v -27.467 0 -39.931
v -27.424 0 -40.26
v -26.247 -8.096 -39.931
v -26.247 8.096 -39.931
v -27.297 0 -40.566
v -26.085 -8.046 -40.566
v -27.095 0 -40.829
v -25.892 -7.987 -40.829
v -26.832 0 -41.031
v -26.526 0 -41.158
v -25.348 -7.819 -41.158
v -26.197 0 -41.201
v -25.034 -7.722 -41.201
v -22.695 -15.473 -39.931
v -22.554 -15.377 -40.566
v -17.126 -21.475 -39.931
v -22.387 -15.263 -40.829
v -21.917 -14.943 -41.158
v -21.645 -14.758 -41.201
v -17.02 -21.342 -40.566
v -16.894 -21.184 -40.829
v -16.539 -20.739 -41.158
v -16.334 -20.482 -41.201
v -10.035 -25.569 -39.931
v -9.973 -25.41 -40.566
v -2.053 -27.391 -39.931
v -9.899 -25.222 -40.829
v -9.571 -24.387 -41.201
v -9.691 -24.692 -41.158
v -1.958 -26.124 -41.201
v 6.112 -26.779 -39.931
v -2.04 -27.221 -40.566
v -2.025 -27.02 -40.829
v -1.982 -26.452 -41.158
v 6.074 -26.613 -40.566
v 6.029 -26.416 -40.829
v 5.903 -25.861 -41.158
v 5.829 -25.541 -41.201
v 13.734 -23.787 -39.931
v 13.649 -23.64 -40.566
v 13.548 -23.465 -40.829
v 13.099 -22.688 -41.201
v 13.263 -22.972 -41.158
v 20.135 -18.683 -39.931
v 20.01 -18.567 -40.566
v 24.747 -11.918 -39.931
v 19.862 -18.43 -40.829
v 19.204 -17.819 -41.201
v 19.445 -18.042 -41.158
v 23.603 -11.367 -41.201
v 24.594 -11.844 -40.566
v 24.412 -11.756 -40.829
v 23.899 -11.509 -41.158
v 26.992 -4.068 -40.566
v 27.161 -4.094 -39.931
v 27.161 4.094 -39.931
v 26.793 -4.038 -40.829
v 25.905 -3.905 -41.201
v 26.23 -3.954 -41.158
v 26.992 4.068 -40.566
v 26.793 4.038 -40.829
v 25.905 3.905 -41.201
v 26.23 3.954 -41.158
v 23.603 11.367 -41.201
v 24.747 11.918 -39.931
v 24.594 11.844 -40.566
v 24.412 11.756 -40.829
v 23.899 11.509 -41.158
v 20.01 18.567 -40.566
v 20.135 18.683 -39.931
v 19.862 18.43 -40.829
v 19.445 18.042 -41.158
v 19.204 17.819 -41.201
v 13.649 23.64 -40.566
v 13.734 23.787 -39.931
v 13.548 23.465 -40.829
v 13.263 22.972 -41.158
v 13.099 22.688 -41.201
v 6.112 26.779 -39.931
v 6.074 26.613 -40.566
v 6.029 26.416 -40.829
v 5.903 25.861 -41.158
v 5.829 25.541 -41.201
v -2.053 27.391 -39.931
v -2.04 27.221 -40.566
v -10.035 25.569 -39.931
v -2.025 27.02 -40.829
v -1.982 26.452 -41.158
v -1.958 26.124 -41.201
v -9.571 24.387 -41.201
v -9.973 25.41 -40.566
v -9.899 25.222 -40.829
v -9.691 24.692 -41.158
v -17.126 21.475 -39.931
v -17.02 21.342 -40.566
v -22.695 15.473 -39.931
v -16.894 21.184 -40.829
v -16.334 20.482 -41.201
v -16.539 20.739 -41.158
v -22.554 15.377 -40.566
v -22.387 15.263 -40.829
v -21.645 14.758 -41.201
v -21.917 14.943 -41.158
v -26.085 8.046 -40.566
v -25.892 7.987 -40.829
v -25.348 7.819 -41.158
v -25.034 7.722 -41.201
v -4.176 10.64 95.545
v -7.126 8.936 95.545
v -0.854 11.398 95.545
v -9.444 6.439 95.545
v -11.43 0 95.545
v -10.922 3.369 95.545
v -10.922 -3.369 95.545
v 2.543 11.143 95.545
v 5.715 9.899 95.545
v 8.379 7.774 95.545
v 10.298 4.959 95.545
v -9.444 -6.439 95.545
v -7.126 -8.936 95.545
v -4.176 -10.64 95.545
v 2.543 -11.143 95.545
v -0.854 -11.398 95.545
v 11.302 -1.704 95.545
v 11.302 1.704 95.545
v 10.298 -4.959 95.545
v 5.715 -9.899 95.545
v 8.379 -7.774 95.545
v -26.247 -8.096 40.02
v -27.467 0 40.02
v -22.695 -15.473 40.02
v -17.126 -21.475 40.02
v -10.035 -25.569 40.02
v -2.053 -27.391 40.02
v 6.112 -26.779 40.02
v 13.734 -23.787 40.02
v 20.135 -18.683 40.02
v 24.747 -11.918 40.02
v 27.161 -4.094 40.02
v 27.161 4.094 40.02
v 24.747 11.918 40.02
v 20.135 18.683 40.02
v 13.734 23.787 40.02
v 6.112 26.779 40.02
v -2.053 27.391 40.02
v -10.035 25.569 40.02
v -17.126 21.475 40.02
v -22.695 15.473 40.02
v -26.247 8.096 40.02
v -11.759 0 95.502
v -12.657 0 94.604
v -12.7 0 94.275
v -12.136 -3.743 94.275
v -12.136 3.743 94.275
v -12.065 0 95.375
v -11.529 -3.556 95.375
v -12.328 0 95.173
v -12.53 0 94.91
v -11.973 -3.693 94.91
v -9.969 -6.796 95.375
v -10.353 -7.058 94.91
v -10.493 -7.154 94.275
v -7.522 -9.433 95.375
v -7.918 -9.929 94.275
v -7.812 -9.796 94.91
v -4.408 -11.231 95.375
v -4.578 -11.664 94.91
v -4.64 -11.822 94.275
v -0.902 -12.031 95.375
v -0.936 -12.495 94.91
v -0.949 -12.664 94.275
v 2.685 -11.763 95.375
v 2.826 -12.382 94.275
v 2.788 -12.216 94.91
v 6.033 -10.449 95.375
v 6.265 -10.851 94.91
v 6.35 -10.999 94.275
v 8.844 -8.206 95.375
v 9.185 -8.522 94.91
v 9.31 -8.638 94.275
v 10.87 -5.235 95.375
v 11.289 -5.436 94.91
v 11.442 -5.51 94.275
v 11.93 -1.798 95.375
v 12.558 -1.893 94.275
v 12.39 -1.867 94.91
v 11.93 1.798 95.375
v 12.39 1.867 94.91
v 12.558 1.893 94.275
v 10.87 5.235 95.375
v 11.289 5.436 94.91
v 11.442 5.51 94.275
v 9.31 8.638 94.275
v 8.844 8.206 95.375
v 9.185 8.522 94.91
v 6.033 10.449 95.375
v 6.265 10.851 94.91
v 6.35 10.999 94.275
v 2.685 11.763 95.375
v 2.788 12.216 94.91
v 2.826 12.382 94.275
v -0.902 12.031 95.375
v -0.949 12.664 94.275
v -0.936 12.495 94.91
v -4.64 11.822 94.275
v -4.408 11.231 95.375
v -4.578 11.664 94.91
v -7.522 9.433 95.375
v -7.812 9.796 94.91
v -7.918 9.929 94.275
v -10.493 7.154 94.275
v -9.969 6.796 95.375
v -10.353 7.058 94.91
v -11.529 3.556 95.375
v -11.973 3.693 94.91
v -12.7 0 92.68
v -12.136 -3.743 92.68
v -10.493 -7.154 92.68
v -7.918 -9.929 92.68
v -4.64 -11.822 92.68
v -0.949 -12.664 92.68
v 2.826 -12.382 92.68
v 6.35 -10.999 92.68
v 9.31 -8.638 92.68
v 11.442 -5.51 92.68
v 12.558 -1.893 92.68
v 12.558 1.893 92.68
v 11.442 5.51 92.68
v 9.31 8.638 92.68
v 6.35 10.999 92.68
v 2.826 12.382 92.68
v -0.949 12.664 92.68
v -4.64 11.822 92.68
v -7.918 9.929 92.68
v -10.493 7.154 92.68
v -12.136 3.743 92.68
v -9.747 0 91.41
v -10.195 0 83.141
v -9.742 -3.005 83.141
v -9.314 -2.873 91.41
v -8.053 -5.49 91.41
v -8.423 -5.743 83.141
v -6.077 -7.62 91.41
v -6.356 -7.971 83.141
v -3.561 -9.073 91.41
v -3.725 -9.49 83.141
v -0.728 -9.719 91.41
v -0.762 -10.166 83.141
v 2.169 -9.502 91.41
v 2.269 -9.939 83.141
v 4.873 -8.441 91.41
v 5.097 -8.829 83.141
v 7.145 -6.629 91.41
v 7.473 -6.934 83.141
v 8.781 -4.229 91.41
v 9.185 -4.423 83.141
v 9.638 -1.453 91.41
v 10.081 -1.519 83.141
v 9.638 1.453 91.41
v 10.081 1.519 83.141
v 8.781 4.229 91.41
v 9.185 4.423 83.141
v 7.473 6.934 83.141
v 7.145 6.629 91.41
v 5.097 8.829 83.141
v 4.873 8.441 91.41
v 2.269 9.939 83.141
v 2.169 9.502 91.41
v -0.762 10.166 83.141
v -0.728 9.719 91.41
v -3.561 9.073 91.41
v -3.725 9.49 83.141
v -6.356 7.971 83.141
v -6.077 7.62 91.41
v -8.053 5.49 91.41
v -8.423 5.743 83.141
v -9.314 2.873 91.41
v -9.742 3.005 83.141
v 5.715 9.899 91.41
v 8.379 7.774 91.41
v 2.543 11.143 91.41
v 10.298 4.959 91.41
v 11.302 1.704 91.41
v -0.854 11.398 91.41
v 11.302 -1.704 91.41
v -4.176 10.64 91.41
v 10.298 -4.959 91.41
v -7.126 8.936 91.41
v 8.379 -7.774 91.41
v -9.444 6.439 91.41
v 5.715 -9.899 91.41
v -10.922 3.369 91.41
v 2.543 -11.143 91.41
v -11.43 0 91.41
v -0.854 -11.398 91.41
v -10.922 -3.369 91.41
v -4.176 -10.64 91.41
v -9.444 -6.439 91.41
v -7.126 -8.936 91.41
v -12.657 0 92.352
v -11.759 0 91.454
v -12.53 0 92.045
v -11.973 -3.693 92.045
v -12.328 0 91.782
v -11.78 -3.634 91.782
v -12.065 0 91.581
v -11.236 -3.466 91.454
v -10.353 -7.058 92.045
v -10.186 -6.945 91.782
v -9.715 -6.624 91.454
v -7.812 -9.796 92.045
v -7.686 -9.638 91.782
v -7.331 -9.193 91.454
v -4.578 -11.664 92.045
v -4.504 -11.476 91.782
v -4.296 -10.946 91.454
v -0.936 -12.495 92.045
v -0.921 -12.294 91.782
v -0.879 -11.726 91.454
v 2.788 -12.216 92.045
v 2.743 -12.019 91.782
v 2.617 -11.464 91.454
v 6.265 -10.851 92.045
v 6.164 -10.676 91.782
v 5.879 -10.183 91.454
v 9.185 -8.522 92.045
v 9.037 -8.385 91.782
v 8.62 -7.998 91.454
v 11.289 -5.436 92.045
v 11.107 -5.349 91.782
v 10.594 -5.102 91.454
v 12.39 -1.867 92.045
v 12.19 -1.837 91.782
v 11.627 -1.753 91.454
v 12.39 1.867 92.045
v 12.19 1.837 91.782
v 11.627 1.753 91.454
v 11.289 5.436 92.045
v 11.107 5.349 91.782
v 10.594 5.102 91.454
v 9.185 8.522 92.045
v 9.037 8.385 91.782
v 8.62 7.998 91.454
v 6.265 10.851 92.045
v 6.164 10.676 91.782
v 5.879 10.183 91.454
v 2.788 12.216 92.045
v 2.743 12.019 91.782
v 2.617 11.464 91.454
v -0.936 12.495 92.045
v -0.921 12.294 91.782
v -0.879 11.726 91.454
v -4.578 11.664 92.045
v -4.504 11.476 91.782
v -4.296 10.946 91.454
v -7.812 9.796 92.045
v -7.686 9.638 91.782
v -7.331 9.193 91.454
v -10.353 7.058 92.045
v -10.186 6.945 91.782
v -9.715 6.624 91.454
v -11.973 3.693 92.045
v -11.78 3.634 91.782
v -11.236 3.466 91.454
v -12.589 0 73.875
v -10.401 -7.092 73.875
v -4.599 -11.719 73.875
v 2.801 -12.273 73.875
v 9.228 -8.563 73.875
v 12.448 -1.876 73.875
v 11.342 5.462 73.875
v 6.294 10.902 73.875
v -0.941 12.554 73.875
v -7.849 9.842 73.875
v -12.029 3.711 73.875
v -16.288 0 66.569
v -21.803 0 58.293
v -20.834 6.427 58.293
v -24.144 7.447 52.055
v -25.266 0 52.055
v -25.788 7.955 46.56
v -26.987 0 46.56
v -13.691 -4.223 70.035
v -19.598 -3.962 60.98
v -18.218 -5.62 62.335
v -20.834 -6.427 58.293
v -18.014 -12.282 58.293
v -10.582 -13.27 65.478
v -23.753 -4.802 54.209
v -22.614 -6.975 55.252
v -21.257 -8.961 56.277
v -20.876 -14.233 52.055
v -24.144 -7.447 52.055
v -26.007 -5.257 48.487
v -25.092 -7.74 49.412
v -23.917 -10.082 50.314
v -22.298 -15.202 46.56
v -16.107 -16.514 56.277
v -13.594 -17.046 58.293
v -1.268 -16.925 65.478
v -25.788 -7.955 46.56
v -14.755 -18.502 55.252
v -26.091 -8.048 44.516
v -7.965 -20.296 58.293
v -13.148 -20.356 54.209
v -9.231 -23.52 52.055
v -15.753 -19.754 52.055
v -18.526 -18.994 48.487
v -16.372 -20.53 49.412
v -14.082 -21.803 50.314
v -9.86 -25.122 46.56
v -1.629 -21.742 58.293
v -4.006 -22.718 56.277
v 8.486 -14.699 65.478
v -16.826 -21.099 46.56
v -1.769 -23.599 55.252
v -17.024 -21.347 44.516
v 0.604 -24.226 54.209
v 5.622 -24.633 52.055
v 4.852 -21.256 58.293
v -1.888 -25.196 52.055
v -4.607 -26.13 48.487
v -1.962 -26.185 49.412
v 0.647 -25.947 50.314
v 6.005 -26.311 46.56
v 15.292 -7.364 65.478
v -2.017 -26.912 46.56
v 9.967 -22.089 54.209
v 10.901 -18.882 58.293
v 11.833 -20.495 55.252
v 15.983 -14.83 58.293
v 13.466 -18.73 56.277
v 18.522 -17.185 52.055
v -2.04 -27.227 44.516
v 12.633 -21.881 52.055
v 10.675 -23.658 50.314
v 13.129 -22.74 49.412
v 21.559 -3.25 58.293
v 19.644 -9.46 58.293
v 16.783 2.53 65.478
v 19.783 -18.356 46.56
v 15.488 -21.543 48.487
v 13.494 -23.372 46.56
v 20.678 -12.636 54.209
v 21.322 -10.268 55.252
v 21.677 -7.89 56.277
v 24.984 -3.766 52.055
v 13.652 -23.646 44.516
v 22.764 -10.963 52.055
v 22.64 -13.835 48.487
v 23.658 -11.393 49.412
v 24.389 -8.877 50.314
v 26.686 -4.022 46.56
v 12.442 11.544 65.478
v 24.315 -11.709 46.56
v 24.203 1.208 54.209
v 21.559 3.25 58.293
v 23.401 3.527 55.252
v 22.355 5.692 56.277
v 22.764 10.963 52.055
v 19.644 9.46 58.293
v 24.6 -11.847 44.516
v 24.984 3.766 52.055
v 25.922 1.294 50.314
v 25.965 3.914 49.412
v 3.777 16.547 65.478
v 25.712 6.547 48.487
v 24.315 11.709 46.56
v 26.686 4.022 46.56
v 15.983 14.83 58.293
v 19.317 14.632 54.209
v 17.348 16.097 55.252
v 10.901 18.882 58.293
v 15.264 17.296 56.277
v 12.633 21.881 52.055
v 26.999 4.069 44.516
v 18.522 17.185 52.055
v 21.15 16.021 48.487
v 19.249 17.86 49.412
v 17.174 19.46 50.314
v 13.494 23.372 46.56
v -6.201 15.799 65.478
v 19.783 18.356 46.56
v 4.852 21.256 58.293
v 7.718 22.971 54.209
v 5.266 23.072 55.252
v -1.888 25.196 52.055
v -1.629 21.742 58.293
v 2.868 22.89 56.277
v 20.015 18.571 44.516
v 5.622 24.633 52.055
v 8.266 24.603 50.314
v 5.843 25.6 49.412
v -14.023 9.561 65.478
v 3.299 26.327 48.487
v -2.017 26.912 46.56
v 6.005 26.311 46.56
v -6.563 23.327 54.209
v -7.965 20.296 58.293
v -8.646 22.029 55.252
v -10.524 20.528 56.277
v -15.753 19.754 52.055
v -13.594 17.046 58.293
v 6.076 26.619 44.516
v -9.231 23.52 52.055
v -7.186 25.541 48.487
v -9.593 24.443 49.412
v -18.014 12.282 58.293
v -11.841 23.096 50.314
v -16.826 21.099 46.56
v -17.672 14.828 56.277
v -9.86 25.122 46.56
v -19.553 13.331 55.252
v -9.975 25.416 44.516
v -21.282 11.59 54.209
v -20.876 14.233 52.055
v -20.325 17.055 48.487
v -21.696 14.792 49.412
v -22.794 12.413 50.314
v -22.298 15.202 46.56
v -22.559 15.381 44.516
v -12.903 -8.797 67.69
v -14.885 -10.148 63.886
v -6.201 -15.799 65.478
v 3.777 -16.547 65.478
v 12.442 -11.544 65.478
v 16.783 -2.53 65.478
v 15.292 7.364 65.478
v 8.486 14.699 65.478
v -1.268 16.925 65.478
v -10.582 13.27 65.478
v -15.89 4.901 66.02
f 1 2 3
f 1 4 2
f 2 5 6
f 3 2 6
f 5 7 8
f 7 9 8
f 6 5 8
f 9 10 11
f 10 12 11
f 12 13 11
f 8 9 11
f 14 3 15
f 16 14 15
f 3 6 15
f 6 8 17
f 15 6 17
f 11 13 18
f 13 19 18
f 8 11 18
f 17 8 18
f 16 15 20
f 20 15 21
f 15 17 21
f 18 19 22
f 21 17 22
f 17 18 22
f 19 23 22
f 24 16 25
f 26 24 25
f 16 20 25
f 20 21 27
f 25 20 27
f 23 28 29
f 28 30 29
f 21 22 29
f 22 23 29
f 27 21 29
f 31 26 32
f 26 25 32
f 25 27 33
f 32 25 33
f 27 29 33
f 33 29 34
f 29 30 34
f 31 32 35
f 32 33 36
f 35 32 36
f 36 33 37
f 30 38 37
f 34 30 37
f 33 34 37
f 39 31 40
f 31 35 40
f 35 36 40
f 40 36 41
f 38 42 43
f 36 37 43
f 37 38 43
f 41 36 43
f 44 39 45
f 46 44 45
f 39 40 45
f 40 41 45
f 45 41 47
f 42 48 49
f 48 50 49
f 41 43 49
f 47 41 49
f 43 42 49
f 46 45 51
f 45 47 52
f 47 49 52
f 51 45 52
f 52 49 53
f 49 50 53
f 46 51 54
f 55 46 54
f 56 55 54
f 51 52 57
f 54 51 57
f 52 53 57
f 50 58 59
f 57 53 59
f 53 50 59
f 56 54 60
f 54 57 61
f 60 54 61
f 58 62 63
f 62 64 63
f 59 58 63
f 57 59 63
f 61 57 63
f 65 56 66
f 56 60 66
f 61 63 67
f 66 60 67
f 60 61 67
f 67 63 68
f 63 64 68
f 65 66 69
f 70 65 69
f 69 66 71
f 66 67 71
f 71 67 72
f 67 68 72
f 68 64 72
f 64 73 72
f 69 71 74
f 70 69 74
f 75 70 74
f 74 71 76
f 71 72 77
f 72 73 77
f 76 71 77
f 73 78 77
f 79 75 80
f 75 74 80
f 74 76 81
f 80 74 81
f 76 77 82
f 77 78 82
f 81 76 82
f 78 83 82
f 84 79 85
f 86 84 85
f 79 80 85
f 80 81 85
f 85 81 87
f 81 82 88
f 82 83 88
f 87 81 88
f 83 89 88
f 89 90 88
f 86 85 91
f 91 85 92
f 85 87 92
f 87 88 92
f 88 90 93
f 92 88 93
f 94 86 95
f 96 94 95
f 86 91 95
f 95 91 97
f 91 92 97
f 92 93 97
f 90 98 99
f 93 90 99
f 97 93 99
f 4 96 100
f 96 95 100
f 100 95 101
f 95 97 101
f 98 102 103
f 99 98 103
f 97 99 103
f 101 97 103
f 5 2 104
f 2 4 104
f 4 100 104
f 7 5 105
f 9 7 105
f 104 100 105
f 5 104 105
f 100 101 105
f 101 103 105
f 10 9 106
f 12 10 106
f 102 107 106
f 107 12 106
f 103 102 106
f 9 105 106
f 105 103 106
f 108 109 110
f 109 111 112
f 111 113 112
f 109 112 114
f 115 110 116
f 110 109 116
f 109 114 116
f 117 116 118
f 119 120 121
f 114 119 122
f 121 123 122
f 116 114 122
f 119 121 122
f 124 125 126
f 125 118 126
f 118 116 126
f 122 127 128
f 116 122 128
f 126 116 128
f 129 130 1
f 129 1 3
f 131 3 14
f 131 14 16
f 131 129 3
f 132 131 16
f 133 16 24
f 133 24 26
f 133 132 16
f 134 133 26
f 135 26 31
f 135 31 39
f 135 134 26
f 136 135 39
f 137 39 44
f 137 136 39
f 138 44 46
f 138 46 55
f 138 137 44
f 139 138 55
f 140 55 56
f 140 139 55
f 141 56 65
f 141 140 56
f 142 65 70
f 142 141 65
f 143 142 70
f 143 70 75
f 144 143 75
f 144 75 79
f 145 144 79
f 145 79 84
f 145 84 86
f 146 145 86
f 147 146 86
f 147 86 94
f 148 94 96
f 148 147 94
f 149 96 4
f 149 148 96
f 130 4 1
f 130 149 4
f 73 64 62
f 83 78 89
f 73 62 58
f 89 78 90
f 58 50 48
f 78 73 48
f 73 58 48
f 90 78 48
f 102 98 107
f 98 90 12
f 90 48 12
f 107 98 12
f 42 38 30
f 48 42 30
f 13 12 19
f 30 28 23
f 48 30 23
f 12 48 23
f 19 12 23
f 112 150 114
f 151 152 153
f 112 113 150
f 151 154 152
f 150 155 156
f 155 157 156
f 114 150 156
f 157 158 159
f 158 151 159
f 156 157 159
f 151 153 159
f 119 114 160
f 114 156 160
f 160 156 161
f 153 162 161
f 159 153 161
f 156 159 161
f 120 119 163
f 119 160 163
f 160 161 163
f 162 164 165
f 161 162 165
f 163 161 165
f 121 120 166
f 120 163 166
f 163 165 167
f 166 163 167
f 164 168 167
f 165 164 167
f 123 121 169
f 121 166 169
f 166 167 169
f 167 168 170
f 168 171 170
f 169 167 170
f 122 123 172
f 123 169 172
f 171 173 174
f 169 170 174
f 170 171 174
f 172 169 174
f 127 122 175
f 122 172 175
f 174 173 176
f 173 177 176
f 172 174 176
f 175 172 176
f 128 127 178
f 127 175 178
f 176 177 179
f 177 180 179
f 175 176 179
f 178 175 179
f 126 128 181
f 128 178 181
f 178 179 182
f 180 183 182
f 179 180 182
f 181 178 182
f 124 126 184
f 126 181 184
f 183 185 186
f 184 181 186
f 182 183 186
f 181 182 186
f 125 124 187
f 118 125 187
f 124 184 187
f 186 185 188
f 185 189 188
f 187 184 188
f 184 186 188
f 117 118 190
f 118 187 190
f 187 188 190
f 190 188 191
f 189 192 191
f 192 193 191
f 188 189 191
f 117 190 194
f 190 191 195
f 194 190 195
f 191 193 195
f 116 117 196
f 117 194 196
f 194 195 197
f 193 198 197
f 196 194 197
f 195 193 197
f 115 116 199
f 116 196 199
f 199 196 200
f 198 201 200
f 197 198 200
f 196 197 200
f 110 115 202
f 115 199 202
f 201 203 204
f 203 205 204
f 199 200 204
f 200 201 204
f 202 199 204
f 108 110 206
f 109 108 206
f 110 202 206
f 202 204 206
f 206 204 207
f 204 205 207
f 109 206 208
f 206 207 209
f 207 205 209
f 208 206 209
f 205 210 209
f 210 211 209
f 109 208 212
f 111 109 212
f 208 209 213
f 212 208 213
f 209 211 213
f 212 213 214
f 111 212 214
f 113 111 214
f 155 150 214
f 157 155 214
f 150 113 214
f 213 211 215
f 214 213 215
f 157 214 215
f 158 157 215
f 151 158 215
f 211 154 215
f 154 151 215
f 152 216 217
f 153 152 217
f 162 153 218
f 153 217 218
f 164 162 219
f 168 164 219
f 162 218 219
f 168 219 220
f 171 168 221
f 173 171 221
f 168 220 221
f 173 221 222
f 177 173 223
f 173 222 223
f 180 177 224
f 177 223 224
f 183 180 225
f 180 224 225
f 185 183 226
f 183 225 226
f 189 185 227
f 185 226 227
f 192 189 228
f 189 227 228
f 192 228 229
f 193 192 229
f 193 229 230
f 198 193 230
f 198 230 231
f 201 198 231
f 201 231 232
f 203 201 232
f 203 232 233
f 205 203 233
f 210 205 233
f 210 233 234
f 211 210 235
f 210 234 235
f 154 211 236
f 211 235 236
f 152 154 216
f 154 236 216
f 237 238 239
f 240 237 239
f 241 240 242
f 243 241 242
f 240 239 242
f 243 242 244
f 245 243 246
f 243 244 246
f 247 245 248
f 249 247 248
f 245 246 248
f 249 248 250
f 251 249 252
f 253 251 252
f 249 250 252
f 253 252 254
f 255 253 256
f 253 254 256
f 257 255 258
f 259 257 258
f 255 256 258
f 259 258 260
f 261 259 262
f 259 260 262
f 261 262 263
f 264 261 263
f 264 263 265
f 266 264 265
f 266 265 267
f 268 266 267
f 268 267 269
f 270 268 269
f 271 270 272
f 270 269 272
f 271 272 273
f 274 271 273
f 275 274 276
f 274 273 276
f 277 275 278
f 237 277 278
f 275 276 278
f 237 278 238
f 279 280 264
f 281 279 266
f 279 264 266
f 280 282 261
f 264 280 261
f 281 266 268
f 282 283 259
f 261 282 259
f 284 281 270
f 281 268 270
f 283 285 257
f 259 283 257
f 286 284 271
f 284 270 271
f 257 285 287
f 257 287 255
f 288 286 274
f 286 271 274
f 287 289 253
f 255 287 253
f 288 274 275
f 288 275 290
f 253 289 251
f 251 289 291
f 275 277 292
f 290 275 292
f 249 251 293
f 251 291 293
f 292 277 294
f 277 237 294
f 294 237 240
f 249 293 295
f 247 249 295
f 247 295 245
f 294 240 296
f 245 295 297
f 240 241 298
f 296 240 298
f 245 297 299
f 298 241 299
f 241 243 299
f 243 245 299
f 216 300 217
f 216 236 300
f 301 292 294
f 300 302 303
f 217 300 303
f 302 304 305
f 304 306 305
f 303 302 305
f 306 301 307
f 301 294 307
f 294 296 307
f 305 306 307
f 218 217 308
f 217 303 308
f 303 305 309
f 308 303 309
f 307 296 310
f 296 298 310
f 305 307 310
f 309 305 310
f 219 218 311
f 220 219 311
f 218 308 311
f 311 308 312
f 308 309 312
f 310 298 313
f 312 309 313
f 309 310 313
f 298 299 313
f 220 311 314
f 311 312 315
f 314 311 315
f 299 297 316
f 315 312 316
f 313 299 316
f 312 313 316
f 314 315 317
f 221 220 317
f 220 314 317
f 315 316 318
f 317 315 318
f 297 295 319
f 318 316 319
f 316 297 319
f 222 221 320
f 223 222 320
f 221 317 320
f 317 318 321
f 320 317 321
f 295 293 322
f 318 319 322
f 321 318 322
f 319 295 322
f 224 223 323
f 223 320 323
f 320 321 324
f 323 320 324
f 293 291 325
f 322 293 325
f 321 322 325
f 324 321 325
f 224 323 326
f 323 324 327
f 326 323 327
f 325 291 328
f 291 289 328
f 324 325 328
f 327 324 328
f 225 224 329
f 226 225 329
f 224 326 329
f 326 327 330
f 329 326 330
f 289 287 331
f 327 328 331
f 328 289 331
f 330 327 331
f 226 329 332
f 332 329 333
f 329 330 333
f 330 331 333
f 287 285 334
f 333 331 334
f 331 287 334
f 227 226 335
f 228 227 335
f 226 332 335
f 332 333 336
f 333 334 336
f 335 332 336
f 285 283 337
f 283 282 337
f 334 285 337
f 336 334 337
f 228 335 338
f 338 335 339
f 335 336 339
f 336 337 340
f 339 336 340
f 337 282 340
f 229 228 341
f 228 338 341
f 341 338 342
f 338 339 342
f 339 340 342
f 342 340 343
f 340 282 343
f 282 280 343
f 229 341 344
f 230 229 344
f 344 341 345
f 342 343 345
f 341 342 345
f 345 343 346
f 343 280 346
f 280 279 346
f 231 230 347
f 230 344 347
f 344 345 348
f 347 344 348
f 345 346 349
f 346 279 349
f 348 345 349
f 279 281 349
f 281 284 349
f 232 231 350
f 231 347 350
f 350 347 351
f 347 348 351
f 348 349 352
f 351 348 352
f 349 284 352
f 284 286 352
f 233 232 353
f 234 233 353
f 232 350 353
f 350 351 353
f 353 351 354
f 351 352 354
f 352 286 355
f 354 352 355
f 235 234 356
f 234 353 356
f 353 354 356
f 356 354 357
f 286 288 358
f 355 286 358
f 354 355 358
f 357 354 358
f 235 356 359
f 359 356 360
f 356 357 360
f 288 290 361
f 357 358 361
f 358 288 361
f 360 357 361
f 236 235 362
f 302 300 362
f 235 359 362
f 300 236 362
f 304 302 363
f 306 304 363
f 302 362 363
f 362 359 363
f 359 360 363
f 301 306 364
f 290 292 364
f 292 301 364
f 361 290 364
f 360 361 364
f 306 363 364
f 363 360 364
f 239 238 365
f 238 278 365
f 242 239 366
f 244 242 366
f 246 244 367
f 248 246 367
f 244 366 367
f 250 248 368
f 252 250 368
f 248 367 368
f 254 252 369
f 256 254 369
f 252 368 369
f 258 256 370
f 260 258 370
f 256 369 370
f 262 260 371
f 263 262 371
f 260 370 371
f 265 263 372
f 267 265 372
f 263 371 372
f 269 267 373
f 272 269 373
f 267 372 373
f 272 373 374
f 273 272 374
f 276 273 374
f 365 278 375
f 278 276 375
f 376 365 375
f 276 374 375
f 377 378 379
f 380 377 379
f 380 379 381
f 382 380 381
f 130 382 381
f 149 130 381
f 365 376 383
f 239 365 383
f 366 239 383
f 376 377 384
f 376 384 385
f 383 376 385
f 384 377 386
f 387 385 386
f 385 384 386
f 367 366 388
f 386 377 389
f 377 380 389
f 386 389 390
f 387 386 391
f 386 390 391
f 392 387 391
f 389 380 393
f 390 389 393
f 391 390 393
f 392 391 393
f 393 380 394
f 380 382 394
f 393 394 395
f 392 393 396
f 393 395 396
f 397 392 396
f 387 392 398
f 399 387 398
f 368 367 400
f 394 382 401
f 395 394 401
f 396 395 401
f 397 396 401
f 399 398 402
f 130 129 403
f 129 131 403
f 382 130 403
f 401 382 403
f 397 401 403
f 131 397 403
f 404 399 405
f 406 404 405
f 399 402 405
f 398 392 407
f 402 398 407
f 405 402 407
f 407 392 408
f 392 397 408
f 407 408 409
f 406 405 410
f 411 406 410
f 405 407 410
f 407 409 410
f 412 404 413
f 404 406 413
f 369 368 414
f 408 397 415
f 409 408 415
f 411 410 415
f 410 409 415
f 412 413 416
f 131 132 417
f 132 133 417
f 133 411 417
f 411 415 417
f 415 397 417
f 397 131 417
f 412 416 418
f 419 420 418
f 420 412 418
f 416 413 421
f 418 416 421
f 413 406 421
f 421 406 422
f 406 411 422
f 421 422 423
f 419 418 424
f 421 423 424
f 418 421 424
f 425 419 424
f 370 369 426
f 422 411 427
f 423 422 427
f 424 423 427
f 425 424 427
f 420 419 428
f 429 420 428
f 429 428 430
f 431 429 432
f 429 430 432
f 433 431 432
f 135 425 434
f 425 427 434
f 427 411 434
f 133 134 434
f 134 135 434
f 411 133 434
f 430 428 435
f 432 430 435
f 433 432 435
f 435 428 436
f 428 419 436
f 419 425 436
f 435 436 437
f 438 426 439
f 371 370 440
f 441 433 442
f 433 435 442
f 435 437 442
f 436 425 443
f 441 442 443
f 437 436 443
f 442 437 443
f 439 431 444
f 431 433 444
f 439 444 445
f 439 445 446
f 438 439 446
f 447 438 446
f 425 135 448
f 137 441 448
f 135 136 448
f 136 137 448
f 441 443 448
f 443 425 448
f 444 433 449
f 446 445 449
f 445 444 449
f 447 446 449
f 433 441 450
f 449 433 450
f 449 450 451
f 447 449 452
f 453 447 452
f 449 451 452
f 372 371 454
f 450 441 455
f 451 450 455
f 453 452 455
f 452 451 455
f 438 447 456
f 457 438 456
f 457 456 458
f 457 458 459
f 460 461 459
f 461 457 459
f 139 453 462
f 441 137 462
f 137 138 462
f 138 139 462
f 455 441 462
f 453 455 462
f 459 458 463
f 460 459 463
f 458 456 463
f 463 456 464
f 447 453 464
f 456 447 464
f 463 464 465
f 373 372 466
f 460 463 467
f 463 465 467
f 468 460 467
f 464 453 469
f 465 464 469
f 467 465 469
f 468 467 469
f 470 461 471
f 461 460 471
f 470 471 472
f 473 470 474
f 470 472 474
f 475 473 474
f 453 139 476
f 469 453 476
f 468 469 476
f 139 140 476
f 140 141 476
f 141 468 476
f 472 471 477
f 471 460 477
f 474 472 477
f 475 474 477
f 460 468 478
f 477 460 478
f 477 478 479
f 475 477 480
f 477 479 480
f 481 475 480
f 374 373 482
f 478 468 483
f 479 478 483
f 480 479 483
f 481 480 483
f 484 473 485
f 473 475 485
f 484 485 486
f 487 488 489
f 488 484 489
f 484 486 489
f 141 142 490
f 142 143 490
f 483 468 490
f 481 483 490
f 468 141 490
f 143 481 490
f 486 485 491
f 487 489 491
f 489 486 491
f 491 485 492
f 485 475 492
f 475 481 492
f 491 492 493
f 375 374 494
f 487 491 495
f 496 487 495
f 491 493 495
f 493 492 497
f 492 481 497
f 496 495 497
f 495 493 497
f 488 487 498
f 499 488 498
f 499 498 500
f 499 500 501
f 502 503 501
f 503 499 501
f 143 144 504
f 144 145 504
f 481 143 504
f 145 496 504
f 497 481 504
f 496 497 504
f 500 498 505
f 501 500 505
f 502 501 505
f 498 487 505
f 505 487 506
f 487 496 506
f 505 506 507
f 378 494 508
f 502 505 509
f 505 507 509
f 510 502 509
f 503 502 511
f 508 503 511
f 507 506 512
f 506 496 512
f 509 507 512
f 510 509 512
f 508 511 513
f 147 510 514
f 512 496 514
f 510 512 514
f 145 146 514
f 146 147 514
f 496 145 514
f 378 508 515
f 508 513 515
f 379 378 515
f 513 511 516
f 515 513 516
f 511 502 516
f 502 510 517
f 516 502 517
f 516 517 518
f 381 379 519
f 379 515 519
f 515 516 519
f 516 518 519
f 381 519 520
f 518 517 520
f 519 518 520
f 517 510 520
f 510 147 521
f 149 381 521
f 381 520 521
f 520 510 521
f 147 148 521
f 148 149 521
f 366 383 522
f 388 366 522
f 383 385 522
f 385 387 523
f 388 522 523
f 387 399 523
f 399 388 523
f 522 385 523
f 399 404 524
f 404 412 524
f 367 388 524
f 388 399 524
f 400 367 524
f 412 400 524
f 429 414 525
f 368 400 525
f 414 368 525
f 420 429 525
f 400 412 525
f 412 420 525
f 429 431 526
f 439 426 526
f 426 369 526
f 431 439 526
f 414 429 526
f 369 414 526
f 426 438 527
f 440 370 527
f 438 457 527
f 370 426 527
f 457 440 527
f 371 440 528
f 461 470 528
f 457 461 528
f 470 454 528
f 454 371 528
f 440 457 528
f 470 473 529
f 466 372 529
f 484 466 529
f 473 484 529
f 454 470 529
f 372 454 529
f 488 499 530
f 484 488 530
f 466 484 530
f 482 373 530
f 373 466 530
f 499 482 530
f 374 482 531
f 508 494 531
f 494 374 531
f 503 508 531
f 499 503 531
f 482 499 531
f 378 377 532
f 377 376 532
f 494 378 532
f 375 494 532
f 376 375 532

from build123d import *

# Parameters (mm, degrees)
F0_W = 27.4674350193
F0_H = 81.2209066684
F5_R = 1.27


with BuildPart() as f1:
    # F0 (on Front) → F1 (revolve)
    with BuildSketch(Plane.XZ):
        with Locations((-13.7337175096, -0.5906961542)):
            Rectangle(F0_W, F0_H)
    revolve(axis=Axis((0, 0, -0.5906961542), (0, 0, 1)))

    # F0 (on Front) → F2 (revolve)
    with BuildSketch(Plane.XZ):
        with BuildLine():
            Line((-27.4674350193, 40.0197571801), (0, 40.0197571801))
            Line((0, 40.0197571801), (0, 83.1406737302))
            Line((0, 83.1406737302), (-10.1947877868, 83.1406737302))
            add(Edge.make_bspline(
                [(-10.1947877868, 83.1406737302), (-13.0487030437, 62.5508222314), (-28.143446303, 58.3851752324), (-27.4674350193, 40.0197571801)],
                knots=[5.8791278865, 5.8791278865, 5.8791278865, 5.8791278865, 54.3602169565, 54.3602169565, 54.3602169565, 54.3602169565], degree=3))
        make_face()
    revolve(axis=Axis((0, 0, 65.7150976558), (0, 0, 1)))

    # F0 (on Front) → F3 (revolve)
    with BuildSketch(Plane.XZ):
        with BuildLine():
            Line((-10.1947877868, 83.1406737302), (0, 83.1406737302))
            Line((0, 83.1406737302), (0, 91.4104381316))
            Line((0, 91.4104381316), (-9.746512388, 91.4104381316))
            add(Edge.make_bspline(
                [(-9.746512388, 91.4104381316), (-9.6826276693, 88.3759155541), (-9.8487037137, 85.6375312152), (-10.1947877868, 83.1406737302)],
                knots=[0, 0, 0, 0, 5.8791278865, 5.8791278865, 5.8791278865, 5.8791278865], degree=3))
        make_face()
    revolve(axis=Axis((0, 0, 65.7150976558), (0, 0, 1)))

    # F0 (on Front) → F4 (revolve)
    with BuildSketch(Plane.XZ):
        Polygon((-9.746512388, 91.4104381316), (0, 91.4104381316), (0, 95.5453233728), (-12.7, 95.5453233728), (-12.7, 91.4104381316), align=None)
    revolve(axis=Axis((0, 0, 93.4778807522), (0, 0, 1)))

    # F5
    f5_edges = [f1.edges().sort_by_distance(p)[0] for p in [
        (12.7, 0, 91.410438),
        (12.7, 0, 95.545323),
        (27.467435, 0, -41.201149),
    ]]
    fillet(f5_edges, radius=F5_R)


solid = f1.part
